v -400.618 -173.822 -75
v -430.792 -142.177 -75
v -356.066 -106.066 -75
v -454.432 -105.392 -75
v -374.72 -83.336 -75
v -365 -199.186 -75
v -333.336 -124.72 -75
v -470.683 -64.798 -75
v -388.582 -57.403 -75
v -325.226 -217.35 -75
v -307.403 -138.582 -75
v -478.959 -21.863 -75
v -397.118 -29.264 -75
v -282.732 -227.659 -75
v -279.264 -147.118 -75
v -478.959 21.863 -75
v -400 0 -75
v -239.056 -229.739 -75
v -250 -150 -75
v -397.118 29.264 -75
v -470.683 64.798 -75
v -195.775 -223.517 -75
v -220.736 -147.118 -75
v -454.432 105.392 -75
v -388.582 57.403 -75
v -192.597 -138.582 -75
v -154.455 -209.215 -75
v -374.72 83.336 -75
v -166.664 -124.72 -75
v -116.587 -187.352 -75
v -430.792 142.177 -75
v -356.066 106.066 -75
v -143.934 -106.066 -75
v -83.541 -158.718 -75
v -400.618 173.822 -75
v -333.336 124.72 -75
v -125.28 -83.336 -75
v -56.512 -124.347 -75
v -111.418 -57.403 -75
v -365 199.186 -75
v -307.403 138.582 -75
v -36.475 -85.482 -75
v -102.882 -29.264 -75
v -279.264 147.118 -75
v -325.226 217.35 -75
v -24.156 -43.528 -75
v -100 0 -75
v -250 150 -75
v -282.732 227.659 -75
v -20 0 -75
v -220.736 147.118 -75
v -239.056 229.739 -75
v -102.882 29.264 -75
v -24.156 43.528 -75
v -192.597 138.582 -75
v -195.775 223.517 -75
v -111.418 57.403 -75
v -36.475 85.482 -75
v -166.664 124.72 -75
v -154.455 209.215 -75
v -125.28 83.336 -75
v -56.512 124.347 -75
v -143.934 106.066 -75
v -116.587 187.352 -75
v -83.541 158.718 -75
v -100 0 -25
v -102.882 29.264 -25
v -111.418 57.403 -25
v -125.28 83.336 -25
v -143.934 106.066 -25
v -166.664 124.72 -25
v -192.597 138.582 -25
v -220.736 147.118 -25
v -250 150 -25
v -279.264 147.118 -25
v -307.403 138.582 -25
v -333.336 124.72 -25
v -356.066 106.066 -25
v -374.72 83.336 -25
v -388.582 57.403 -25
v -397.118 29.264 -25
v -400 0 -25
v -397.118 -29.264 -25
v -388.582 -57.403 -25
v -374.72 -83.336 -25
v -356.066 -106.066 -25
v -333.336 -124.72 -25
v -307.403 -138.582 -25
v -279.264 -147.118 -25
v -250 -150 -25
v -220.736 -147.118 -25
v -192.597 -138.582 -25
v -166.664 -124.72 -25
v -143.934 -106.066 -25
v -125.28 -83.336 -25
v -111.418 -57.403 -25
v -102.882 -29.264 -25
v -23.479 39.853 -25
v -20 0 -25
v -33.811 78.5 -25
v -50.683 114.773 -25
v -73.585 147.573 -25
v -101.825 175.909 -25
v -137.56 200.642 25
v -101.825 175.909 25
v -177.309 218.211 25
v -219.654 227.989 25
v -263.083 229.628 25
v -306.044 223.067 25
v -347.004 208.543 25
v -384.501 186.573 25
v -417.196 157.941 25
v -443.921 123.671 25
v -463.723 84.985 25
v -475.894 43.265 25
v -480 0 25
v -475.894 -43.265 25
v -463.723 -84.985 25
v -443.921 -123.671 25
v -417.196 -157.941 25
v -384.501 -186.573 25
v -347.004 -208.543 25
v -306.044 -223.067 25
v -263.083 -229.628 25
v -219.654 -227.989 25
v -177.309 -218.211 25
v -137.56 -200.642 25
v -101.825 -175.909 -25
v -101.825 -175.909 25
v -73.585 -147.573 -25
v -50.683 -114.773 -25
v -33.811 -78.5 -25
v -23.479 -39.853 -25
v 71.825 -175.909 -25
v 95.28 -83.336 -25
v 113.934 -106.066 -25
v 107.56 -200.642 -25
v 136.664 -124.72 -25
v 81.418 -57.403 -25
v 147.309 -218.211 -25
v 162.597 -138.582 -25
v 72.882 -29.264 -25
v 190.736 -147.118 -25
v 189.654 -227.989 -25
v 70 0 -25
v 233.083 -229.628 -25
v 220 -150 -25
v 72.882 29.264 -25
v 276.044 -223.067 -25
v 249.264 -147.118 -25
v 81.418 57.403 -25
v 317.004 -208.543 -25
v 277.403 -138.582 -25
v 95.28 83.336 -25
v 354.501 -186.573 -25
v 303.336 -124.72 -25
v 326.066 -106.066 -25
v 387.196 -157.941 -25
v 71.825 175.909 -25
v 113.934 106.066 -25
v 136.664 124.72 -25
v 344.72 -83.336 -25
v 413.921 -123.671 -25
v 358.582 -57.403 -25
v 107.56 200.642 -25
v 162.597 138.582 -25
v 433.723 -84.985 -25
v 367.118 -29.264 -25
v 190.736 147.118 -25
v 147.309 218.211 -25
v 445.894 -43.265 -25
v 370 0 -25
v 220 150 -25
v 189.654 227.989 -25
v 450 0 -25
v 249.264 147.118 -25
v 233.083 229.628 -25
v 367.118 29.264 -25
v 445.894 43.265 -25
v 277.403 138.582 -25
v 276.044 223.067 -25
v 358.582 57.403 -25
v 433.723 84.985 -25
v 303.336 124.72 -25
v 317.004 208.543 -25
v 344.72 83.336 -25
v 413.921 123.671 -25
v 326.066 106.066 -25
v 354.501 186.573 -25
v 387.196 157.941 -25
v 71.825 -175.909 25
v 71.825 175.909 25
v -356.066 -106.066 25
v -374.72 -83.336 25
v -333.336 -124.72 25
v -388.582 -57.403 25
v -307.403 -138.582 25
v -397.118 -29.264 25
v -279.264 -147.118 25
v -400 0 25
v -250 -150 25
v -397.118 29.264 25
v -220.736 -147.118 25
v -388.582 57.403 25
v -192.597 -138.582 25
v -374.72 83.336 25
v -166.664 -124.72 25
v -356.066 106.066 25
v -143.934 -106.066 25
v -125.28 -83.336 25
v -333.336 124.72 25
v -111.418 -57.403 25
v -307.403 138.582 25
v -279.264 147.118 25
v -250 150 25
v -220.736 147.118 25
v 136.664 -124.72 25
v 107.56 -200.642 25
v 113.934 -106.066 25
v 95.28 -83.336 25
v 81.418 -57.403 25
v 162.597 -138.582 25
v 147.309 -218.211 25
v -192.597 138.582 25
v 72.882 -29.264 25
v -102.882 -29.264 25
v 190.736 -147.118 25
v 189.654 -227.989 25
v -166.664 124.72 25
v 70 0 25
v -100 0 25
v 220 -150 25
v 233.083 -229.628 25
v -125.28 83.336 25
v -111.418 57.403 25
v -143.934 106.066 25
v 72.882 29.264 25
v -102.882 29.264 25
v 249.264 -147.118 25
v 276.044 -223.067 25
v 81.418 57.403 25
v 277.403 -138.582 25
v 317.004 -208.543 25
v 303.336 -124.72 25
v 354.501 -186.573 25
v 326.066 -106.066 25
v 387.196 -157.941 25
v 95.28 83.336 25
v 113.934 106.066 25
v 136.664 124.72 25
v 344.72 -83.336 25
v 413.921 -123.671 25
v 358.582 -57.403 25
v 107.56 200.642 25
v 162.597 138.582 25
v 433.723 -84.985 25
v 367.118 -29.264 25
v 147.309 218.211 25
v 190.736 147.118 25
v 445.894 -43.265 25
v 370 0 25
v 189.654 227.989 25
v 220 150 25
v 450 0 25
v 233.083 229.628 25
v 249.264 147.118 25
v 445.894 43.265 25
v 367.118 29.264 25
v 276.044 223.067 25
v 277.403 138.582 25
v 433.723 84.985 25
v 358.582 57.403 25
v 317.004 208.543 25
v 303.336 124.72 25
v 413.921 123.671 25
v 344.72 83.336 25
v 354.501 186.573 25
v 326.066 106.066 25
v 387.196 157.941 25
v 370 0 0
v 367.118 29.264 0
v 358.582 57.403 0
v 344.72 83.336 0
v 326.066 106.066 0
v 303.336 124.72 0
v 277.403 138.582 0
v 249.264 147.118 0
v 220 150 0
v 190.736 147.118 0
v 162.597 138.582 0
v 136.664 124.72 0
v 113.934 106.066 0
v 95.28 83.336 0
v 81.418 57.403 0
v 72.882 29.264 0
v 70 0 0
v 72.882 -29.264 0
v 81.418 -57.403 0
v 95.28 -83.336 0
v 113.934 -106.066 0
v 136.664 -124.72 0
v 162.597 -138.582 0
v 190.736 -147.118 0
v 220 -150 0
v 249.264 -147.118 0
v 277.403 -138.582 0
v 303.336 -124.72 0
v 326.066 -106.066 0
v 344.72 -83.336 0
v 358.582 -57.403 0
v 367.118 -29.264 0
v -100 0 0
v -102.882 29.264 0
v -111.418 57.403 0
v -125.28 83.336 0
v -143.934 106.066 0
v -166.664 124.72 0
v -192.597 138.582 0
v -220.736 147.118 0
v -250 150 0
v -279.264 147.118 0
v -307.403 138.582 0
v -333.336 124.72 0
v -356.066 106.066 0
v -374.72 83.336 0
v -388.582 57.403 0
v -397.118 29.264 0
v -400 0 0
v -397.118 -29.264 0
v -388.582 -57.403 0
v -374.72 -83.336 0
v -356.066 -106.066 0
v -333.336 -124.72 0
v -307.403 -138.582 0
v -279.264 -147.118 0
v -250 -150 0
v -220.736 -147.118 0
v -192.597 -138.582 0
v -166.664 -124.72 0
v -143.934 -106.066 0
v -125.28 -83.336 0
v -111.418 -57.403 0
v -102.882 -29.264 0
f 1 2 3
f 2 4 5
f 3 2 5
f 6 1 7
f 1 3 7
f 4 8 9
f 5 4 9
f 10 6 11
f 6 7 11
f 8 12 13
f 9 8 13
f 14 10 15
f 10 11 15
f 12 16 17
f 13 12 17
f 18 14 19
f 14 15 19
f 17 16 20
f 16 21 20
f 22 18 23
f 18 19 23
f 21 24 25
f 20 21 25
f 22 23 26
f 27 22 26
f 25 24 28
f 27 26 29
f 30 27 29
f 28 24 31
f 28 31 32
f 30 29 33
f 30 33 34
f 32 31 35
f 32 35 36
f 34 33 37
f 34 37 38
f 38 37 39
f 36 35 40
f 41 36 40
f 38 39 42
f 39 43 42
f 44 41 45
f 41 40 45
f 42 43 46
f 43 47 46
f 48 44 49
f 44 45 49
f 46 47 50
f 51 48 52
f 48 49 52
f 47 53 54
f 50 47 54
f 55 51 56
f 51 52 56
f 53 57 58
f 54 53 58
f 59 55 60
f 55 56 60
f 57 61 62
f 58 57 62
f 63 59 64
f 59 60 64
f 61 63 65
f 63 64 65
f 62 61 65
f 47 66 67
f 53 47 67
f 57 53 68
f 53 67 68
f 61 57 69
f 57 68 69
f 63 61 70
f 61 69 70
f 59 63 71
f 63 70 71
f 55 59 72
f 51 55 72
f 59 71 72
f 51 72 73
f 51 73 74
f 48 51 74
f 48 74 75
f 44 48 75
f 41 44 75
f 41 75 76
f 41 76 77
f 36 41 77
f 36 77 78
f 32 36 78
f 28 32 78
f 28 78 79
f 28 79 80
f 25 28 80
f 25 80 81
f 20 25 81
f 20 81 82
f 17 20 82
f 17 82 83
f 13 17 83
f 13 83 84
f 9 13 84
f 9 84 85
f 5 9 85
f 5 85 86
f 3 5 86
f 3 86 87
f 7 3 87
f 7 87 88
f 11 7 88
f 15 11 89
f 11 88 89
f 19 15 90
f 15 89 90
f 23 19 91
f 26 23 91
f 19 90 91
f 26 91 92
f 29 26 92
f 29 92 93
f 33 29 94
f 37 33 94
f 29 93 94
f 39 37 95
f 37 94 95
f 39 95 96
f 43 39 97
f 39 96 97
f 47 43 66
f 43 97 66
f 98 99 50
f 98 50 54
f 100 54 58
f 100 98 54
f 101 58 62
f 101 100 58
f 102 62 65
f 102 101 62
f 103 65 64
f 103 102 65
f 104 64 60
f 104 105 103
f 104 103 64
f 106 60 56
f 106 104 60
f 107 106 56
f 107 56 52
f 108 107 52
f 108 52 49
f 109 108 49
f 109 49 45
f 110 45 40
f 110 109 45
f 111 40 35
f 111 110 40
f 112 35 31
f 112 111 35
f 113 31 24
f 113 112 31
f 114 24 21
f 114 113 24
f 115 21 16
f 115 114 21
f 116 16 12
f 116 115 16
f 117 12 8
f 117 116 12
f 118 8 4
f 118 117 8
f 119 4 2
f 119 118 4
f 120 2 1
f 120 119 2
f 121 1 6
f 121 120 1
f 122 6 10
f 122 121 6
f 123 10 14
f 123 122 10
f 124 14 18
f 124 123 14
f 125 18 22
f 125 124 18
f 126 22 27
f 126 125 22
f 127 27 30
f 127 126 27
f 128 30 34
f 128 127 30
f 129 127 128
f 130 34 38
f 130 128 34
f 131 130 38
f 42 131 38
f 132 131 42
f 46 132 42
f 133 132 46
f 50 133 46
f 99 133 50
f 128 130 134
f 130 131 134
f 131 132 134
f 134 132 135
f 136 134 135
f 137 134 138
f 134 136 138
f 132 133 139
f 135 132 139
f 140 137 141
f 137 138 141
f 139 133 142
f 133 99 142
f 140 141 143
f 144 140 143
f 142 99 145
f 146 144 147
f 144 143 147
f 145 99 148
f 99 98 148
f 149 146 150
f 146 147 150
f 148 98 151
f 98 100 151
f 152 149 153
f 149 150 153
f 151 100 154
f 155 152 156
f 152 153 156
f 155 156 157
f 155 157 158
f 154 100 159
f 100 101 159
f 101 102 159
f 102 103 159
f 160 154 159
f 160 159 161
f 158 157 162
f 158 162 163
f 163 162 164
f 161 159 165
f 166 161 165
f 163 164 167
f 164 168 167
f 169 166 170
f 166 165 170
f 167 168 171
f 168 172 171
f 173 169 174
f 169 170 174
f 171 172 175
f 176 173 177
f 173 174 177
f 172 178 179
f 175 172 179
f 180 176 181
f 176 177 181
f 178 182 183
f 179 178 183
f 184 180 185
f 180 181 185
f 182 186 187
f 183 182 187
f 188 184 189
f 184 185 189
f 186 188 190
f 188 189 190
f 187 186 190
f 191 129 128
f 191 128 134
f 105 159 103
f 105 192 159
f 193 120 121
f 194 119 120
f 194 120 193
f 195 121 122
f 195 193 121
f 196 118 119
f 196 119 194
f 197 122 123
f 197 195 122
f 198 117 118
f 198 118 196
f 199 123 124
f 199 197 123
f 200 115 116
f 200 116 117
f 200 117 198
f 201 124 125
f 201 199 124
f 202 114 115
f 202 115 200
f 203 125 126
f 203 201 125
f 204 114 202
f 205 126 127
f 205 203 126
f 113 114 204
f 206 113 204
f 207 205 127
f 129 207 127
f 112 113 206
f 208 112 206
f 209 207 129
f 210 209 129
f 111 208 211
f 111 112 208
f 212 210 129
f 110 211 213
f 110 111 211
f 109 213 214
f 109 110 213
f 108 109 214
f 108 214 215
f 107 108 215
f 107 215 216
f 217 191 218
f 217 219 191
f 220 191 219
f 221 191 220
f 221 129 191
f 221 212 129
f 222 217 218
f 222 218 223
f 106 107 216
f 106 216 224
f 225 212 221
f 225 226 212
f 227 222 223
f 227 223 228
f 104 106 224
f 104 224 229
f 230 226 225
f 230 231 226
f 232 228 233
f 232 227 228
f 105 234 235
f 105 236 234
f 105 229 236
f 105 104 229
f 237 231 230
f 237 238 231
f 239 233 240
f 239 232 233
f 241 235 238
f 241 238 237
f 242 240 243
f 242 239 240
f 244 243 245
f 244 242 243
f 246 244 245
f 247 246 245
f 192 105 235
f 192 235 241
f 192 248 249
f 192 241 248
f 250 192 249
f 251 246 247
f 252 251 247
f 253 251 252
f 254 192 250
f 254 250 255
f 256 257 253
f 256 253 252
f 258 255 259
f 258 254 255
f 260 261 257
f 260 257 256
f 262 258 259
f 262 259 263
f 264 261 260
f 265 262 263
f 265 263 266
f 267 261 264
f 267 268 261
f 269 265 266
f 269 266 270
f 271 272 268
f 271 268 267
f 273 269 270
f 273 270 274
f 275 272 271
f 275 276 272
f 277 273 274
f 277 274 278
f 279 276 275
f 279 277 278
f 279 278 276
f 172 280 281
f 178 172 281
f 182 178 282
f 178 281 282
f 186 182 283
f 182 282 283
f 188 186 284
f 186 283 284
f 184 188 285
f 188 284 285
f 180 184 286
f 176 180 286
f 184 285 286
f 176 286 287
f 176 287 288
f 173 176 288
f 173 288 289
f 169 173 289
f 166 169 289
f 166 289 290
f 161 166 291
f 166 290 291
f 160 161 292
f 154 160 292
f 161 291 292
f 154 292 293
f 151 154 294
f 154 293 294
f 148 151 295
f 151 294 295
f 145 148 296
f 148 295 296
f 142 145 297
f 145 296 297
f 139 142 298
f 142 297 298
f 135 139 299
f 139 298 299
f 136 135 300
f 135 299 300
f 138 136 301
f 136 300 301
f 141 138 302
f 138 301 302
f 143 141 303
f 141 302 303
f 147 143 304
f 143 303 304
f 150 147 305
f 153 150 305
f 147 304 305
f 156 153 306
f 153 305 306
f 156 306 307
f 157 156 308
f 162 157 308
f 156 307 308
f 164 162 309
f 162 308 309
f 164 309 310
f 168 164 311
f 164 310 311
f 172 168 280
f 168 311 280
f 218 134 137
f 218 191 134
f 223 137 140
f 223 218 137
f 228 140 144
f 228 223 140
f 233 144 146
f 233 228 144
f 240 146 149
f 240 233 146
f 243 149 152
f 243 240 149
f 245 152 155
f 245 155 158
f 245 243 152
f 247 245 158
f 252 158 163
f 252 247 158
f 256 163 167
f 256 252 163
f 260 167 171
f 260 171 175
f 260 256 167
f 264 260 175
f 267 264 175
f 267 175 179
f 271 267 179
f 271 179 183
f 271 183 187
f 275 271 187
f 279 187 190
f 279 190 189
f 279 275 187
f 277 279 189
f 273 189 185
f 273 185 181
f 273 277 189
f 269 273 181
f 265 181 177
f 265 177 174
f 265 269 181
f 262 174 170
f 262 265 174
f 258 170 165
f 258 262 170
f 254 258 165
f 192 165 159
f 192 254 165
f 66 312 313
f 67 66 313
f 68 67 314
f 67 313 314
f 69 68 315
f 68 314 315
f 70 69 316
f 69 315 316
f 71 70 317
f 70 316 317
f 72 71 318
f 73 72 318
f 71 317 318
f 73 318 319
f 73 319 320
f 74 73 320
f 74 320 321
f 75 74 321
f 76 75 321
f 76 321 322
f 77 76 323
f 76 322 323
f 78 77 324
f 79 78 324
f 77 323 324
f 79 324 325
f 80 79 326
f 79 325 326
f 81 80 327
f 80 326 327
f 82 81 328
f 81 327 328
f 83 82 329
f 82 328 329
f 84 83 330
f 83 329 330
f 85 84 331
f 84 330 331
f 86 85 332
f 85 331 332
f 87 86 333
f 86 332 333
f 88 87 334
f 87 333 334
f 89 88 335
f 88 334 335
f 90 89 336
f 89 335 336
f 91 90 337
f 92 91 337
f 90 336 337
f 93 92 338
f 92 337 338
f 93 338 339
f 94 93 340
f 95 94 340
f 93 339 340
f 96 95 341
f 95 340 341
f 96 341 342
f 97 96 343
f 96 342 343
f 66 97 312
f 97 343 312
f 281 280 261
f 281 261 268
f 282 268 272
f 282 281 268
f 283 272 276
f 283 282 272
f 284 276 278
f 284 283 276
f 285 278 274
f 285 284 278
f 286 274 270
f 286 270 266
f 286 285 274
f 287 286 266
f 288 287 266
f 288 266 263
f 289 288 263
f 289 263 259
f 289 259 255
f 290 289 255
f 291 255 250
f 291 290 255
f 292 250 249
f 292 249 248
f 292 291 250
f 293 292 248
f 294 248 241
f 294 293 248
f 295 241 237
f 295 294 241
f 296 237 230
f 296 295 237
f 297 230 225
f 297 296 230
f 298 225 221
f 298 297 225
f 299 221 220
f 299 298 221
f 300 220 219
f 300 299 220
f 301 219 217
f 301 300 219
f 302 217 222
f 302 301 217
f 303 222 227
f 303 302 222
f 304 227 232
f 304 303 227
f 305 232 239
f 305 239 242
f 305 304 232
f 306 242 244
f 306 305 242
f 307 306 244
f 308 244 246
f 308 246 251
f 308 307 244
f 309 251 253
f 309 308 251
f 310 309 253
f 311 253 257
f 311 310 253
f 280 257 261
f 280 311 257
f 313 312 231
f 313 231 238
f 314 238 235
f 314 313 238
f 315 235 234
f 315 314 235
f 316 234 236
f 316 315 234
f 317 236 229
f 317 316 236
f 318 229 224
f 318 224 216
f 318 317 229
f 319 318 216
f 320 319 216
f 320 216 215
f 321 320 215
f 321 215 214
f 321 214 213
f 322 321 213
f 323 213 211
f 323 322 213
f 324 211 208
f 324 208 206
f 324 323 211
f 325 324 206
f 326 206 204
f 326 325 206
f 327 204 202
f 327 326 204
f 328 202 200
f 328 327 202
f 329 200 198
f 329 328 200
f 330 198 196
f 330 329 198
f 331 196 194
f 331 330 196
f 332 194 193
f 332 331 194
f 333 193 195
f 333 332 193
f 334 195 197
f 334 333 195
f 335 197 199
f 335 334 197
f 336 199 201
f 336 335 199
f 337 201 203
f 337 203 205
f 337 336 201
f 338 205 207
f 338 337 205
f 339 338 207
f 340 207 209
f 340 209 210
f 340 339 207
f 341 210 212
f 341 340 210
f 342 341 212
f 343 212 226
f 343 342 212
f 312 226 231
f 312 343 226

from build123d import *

# Parameters (mm, degrees)
BOSS_EXTRUDE1_DEPTH      = 25
BOSS_EXTRUDE1_DEPTH_BACK = 25
SKETCH4_R                = 150
BOSS_EXTRUDE2_START      = -75
SKETCH4_4_R              = 150
BOSS_EXTRUDE2_DEPTH      = 75


with BuildPart() as part:
    # Sketch4 → Boss-Extrude1 (new, two sides: drawn at the far end of the back side and taken through both)
    with BuildSketch(Plane.XY.offset(-BOSS_EXTRUDE1_DEPTH_BACK)):
        with BuildLine():
            Line((71.8245835, 175.909198012), (-101.8245835, 175.909198012))
            ThreePointArc((-101.8245835, 175.909198012), (-480, 0), (-101.8245835, -175.909198012))
            Line((-101.8245835, -175.909198012), (71.8245835, -175.909198012))
            ThreePointArc((71.8245835, -175.909198012), (450, 0), (71.8245835, 175.909198012))
        make_face()
        with Locations((220, 0)):
            Circle(SKETCH4_R, mode=Mode.SUBTRACT)
        with Locations((-250, 0)):
            Circle(SKETCH4_R, mode=Mode.SUBTRACT)
    extrude(amount=BOSS_EXTRUDE1_DEPTH + BOSS_EXTRUDE1_DEPTH_BACK)

    # Sketch4<4> → Boss-Extrude2 (add)
    with BuildSketch(Plane.XY.offset(BOSS_EXTRUDE2_START)):
        with BuildLine():
            ThreePointArc((-20, 0), (-41.45702386, 97.004263321), (-101.8245835, 175.909198012))
            ThreePointArc((-101.8245835, 175.909198012), (-480, 0), (-101.8245835, -175.909198012))
            ThreePointArc((-101.8245835, -175.909198012), (-41.45702386, -97.004263321), (-20, 0))
        make_face()
        with Locations((-250, 0)):
            Circle(SKETCH4_4_R, mode=Mode.SUBTRACT)
    extrude(amount=BOSS_EXTRUDE2_DEPTH)


solid = part.part
